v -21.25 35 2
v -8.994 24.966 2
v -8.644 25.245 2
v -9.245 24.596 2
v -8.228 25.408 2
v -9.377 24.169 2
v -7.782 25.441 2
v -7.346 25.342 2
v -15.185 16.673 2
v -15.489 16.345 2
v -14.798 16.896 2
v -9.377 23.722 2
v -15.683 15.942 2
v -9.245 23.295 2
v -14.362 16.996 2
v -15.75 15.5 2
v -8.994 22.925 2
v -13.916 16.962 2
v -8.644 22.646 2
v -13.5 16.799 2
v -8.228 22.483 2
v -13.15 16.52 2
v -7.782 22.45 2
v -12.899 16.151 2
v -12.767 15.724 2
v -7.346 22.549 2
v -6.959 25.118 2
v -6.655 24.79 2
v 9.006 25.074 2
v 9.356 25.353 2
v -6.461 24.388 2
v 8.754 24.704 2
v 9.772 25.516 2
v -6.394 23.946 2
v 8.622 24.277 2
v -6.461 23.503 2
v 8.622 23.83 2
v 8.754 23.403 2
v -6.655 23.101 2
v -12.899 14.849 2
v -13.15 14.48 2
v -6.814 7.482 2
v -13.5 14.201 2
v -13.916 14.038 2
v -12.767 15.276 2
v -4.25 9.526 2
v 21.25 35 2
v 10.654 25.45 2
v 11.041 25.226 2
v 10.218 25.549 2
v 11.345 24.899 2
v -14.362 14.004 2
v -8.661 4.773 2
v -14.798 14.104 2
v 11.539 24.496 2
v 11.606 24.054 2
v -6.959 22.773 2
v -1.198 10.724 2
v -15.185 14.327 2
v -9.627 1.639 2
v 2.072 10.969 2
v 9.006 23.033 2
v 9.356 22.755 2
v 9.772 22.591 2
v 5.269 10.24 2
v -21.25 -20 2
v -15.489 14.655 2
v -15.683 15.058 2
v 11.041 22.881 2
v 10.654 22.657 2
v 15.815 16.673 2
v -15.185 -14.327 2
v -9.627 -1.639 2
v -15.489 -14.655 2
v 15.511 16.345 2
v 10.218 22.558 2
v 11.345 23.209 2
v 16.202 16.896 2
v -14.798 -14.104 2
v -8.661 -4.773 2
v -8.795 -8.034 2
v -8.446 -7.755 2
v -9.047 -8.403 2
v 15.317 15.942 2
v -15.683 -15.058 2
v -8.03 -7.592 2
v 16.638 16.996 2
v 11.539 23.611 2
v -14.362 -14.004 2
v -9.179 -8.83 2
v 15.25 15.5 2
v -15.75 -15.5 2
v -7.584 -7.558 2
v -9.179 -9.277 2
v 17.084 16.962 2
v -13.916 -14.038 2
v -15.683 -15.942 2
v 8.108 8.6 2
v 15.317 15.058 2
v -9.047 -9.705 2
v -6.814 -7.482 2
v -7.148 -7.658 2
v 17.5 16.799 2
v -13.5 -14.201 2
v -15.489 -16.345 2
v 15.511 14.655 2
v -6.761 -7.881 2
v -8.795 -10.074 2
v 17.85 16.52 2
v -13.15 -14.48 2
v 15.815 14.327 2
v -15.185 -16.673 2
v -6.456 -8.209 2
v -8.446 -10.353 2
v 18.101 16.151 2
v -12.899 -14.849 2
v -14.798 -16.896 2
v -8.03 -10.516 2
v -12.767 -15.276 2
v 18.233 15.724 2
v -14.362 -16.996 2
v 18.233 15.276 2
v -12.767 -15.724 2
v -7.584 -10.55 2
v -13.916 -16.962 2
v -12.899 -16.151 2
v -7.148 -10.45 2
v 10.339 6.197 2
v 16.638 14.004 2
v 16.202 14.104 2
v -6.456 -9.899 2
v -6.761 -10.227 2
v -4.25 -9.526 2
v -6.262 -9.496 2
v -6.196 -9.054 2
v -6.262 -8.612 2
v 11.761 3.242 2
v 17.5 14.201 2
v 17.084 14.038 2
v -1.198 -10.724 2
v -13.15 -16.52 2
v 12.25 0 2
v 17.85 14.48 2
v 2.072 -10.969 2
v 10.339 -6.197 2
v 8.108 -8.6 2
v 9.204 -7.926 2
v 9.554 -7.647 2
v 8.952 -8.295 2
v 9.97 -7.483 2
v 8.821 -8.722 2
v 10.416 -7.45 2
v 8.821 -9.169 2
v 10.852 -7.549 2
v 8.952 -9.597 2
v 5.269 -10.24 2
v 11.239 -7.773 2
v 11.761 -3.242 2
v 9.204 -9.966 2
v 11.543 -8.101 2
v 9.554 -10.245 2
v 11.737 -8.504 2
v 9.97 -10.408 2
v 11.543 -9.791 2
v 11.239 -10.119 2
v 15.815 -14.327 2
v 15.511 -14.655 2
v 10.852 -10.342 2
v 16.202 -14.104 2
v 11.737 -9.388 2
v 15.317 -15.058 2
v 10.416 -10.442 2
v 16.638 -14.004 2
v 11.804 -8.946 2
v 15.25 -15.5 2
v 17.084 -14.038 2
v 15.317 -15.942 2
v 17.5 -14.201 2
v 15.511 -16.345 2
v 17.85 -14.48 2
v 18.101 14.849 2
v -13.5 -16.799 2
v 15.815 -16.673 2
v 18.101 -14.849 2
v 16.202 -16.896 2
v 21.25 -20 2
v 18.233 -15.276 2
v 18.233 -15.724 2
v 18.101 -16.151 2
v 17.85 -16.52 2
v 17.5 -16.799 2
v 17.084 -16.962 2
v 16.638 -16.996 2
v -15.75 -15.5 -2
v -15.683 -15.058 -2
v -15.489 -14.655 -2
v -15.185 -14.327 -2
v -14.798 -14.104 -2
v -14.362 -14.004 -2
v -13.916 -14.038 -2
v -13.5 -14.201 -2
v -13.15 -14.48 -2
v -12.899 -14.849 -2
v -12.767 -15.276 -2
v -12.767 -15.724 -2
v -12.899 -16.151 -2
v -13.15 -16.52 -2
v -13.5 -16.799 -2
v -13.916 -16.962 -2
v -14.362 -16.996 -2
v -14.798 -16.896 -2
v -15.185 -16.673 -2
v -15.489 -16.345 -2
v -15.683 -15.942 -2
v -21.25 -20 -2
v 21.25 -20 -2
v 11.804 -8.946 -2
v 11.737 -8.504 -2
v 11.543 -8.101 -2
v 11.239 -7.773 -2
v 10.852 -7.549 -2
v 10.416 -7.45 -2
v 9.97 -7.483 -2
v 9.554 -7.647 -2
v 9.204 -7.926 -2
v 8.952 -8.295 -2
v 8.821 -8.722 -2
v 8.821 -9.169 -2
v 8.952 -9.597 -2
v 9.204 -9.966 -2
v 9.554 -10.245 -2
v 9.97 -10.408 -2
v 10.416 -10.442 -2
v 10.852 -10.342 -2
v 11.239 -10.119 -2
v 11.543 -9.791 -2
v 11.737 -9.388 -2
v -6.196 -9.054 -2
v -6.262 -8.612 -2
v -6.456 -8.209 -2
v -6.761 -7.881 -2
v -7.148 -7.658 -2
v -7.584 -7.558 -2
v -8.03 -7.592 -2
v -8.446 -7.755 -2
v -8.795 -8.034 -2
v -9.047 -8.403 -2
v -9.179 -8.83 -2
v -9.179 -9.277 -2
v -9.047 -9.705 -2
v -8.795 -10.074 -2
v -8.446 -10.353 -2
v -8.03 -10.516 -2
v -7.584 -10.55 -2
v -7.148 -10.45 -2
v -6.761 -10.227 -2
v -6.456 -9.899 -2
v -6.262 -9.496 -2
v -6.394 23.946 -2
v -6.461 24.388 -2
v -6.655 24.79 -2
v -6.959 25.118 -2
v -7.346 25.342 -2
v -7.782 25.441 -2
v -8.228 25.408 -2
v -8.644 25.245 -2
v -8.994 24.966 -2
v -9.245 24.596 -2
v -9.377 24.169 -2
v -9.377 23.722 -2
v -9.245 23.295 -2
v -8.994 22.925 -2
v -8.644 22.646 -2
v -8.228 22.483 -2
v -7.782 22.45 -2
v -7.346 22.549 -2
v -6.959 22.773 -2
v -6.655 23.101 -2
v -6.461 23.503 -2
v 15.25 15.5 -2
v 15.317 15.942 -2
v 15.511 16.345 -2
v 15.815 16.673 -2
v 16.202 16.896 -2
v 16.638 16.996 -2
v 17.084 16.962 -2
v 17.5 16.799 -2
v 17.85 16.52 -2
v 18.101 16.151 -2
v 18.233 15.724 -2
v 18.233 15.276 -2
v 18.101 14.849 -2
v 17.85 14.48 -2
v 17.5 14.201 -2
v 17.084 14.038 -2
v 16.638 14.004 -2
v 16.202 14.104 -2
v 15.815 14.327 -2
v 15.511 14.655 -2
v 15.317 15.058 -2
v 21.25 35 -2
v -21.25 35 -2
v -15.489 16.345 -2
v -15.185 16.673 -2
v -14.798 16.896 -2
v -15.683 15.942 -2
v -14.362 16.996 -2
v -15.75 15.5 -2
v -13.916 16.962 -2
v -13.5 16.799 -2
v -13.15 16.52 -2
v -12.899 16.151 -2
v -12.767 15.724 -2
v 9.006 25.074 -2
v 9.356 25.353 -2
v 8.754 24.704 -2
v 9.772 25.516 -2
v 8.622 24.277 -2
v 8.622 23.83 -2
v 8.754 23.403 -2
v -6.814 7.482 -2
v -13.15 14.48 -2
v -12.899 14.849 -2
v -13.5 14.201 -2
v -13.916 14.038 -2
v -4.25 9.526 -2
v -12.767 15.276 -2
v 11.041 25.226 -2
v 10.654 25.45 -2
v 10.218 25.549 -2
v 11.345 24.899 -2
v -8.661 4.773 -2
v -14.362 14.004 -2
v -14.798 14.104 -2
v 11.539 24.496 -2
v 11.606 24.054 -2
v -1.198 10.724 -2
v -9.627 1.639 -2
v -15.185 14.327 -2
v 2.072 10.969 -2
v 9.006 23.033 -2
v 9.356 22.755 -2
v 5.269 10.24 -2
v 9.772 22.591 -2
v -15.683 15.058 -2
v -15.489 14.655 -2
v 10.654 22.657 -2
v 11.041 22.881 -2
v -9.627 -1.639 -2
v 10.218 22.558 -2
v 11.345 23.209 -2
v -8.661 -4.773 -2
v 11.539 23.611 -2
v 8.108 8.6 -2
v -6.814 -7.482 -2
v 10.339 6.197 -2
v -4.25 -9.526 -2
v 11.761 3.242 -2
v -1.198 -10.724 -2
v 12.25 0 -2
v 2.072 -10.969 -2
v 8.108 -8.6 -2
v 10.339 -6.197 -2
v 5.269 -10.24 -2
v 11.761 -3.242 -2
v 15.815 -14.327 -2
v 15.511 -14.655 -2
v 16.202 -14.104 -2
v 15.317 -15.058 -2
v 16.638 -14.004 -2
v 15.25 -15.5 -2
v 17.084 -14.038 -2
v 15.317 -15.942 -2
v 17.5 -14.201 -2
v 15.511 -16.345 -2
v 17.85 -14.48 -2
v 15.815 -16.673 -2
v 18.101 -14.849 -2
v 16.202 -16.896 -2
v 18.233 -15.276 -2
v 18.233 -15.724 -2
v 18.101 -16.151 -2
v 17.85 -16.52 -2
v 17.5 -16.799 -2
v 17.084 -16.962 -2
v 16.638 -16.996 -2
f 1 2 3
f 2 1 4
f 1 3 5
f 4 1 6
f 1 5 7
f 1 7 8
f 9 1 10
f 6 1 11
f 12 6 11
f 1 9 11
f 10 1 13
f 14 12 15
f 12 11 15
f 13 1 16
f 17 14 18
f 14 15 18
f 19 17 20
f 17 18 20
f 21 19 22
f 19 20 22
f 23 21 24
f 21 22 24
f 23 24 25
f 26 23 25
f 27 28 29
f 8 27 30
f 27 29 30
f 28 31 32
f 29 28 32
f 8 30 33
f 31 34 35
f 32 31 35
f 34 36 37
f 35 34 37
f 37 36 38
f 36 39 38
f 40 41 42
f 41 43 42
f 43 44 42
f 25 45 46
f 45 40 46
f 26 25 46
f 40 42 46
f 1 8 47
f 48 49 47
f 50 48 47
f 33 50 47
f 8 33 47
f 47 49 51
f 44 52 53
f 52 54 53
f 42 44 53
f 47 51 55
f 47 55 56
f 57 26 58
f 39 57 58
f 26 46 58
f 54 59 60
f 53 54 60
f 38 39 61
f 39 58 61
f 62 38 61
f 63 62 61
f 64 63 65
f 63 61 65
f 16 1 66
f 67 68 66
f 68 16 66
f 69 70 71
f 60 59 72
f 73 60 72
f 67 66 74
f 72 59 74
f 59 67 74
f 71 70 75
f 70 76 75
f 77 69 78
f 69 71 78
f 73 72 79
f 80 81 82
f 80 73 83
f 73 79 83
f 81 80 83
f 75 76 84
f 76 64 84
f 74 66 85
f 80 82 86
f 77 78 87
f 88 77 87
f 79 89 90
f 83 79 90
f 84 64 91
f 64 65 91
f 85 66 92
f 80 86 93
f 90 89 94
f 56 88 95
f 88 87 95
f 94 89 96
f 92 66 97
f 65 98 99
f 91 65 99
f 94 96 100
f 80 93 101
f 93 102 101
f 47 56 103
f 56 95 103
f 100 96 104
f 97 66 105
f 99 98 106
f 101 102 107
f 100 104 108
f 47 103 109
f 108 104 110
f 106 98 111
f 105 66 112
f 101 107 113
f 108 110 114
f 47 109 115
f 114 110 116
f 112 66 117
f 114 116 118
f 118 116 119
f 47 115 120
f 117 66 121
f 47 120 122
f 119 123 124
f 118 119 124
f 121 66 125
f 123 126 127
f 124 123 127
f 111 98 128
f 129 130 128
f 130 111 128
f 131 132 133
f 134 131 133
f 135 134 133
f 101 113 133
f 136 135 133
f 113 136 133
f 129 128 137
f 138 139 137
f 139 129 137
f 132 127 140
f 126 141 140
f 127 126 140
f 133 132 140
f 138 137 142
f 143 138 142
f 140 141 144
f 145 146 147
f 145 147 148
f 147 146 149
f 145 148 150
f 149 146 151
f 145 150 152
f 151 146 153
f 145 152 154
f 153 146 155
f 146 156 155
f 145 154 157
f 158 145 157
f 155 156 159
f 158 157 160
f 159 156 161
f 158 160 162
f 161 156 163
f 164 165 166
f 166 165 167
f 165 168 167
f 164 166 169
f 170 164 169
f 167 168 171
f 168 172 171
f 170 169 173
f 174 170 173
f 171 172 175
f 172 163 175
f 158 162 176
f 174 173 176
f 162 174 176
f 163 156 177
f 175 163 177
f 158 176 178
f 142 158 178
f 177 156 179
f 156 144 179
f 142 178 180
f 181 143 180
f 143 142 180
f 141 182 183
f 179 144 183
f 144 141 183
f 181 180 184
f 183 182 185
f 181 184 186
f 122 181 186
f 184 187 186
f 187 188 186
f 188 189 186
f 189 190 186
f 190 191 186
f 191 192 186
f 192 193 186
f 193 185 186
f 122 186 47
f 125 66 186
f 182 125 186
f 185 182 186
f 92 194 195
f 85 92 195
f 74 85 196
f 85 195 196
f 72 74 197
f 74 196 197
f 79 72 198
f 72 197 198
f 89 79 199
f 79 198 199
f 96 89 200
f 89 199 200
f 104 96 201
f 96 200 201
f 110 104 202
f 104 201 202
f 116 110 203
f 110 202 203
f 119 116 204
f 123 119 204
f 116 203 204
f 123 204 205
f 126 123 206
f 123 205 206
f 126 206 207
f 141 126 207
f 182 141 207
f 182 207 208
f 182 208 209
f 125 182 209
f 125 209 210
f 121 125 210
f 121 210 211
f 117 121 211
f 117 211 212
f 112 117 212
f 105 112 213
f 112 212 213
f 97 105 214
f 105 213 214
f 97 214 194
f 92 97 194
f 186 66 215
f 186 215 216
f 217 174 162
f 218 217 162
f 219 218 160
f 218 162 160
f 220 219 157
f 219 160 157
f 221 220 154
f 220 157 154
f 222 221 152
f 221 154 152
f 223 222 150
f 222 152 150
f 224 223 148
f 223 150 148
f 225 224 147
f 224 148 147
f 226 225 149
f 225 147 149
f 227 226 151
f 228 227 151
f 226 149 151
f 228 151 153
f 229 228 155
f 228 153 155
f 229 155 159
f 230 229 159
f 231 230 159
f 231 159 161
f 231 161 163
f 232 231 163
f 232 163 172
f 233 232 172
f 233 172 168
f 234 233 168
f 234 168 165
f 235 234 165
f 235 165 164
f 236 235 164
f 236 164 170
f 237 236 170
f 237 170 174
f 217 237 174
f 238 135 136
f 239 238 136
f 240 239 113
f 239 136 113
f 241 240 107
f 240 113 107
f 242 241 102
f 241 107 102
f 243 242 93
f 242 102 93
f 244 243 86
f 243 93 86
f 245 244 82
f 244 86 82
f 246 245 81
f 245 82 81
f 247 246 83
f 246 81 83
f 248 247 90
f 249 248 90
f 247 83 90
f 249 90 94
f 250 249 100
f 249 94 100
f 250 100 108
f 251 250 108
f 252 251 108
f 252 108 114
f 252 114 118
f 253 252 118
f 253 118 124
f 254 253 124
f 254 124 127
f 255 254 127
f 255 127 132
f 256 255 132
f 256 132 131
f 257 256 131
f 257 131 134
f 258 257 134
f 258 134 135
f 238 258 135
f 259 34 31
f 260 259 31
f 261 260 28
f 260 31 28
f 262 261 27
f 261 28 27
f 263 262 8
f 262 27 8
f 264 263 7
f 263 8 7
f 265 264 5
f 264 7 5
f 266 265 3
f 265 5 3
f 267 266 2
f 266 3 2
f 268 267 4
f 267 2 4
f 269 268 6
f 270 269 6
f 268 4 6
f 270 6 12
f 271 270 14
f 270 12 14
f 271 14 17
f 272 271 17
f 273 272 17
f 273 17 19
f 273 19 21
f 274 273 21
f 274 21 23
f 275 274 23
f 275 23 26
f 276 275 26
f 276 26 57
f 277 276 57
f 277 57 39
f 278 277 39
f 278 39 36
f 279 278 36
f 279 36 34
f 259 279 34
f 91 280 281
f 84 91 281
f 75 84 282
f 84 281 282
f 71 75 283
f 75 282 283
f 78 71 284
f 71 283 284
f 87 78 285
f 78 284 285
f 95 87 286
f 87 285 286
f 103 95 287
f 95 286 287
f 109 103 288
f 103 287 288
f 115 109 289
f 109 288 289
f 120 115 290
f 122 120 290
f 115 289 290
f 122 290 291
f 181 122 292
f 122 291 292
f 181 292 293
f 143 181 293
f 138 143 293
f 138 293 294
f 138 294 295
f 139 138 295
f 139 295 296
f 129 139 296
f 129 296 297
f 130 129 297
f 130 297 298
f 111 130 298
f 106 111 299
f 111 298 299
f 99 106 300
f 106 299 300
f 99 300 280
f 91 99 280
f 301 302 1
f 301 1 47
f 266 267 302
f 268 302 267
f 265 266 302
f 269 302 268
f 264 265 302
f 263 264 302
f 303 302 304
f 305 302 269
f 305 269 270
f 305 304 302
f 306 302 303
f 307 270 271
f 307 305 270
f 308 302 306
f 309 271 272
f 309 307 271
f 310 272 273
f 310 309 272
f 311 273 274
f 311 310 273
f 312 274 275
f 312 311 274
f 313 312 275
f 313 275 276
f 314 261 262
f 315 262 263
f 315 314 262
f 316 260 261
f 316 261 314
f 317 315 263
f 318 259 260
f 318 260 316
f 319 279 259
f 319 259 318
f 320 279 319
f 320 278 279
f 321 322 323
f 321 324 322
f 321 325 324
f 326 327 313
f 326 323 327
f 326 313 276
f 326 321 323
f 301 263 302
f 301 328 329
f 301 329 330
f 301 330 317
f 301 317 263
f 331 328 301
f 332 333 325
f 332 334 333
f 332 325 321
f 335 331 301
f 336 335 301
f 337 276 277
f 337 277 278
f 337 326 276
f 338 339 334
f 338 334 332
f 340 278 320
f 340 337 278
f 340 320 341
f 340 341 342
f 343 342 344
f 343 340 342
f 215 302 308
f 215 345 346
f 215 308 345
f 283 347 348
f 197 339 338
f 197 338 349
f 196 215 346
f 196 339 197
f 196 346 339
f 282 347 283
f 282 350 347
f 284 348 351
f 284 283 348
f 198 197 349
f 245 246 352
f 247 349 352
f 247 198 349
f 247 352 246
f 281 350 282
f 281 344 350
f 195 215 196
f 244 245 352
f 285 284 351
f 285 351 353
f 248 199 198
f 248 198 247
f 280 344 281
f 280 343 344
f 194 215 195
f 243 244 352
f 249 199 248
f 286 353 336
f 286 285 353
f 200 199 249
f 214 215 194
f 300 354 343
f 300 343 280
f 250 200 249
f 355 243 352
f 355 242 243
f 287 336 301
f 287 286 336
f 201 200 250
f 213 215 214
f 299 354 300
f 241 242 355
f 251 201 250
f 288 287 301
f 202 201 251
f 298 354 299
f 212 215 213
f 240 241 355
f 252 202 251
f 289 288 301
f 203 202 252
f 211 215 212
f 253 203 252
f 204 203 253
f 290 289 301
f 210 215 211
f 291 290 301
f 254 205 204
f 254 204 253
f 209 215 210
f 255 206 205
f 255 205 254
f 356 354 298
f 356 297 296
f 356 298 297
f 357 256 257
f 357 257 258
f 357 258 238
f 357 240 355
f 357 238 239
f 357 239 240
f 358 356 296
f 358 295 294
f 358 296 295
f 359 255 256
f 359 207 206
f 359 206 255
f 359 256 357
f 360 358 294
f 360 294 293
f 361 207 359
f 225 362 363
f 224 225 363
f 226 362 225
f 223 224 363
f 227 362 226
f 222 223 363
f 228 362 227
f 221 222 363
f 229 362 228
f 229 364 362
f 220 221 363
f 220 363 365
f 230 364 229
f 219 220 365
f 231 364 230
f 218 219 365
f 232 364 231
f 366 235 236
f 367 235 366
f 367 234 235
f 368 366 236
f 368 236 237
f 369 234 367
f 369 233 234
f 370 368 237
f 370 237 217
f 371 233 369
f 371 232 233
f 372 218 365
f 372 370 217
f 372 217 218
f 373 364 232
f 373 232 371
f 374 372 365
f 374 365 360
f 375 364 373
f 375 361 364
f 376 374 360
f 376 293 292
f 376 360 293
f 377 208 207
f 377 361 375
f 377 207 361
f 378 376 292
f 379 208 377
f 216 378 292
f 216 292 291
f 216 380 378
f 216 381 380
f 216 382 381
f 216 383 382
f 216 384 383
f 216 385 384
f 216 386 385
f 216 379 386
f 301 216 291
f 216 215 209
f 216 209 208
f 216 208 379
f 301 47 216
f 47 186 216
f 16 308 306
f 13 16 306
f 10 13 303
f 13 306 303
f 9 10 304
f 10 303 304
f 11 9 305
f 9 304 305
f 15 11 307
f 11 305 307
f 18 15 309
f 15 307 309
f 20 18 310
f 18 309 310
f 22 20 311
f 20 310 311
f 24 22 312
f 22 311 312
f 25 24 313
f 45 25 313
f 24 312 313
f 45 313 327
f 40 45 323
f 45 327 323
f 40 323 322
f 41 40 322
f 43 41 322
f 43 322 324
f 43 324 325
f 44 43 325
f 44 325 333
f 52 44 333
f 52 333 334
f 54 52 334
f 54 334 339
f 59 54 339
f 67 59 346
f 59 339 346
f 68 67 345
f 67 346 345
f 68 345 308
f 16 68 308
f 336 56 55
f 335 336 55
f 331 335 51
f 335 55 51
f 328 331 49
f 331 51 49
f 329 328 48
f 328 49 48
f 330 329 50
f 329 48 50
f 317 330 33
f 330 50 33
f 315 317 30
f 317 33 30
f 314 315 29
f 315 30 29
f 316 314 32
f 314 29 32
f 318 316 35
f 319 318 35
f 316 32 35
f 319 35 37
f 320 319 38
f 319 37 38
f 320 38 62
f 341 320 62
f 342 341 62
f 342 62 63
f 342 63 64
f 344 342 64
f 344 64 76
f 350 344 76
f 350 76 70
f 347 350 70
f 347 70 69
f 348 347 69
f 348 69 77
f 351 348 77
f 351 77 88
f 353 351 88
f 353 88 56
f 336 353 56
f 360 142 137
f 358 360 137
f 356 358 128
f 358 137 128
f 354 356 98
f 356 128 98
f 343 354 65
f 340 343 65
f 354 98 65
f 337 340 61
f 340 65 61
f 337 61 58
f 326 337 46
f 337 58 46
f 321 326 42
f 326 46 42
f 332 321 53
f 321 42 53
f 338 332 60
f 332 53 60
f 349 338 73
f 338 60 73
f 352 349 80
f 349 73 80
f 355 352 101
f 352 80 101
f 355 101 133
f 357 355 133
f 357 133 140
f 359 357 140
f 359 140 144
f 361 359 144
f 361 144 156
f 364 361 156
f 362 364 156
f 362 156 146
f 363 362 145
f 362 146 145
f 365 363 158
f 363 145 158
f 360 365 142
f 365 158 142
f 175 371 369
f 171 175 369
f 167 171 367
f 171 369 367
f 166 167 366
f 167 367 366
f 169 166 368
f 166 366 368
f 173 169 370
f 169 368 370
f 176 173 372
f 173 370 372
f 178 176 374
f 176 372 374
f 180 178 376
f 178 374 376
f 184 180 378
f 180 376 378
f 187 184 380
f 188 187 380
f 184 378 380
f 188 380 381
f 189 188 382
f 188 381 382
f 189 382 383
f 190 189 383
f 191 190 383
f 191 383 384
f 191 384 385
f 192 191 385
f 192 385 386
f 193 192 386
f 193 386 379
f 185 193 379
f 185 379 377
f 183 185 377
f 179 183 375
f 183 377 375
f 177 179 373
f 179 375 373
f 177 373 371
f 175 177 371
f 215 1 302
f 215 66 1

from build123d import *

# Parameters (mm, degrees)
SKETCH1_W           = 42.5
SKETCH1_H           = 40
BOSS_EXTRUDE1_DEPTH = 2
SKETCH2_R           = 1.5
CUT_EXTRUDE1_DEPTH  = 4
SKETCH3_R           = 11
CUT_EXTRUDE2_DEPTH  = 4
SKETCH4_W           = 42.5
SKETCH4_H           = 4
BOSS_EXTRUDE2_DEPTH = 15
SKETCH7_R           = 1.5
CUT_EXTRUDE3_DEPTH  = 10


with BuildPart() as part:
    # Sketch1 → Boss-Extrude1 (new, symmetric)
    with BuildSketch(Plane.XY):
        Rectangle(SKETCH1_W, SKETCH1_H)
    extrude(amount=BOSS_EXTRUDE1_DEPTH, both=True)

    # Sketch2 → Cut-Extrude1 (cut)
    with BuildSketch(Plane(origin=(0, 0, -2), x_dir=(-1, 0, 0), z_dir=(0, 0, -1))):
        with Locations((-16.75, 15.5)):
            Circle(SKETCH2_R)
        with Locations((14.25, 15.5)):
            Circle(SKETCH2_R)
        with Locations((14.25, -15.5)):
            Circle(SKETCH2_R)
        with Locations((-16.75, -15.5)):
            Circle(SKETCH2_R)
    extrude(amount=-CUT_EXTRUDE1_DEPTH, mode=Mode.SUBTRACT)

    # Sketch3 → Cut-Extrude2 (cut)
    with BuildSketch(Plane.XY.offset(2)):
        with Locations((1.25, 0)):
            Circle(SKETCH3_R)
    extrude(amount=-CUT_EXTRUDE2_DEPTH, mode=Mode.SUBTRACT)

    # Sketch4 → Boss-Extrude2 (add)
    with BuildSketch(Plane(origin=(0, 20, 0), x_dir=(1, 0, 0), z_dir=(0, 1, 0))):
        Rectangle(SKETCH4_W, SKETCH4_H)
    extrude(amount=BOSS_EXTRUDE2_DEPTH)

    # Sketch7 → Cut-Extrude3 (cut)
    with BuildSketch(Plane.XY.offset(2)):
        with Locations((-7.894013049, 23.945501151)):
            Circle(SKETCH7_R)
        with Locations((10.105662158, 24.053632735)):
            Circle(SKETCH7_R)
        with Locations((10.303903396, -8.945771811)):
            Circle(SKETCH7_R)
        with Locations((-7.695771811, -9.053903396)):
            Circle(SKETCH7_R)
    extrude(amount=-CUT_EXTRUDE3_DEPTH, mode=Mode.SUBTRACT)


solid = part.part
